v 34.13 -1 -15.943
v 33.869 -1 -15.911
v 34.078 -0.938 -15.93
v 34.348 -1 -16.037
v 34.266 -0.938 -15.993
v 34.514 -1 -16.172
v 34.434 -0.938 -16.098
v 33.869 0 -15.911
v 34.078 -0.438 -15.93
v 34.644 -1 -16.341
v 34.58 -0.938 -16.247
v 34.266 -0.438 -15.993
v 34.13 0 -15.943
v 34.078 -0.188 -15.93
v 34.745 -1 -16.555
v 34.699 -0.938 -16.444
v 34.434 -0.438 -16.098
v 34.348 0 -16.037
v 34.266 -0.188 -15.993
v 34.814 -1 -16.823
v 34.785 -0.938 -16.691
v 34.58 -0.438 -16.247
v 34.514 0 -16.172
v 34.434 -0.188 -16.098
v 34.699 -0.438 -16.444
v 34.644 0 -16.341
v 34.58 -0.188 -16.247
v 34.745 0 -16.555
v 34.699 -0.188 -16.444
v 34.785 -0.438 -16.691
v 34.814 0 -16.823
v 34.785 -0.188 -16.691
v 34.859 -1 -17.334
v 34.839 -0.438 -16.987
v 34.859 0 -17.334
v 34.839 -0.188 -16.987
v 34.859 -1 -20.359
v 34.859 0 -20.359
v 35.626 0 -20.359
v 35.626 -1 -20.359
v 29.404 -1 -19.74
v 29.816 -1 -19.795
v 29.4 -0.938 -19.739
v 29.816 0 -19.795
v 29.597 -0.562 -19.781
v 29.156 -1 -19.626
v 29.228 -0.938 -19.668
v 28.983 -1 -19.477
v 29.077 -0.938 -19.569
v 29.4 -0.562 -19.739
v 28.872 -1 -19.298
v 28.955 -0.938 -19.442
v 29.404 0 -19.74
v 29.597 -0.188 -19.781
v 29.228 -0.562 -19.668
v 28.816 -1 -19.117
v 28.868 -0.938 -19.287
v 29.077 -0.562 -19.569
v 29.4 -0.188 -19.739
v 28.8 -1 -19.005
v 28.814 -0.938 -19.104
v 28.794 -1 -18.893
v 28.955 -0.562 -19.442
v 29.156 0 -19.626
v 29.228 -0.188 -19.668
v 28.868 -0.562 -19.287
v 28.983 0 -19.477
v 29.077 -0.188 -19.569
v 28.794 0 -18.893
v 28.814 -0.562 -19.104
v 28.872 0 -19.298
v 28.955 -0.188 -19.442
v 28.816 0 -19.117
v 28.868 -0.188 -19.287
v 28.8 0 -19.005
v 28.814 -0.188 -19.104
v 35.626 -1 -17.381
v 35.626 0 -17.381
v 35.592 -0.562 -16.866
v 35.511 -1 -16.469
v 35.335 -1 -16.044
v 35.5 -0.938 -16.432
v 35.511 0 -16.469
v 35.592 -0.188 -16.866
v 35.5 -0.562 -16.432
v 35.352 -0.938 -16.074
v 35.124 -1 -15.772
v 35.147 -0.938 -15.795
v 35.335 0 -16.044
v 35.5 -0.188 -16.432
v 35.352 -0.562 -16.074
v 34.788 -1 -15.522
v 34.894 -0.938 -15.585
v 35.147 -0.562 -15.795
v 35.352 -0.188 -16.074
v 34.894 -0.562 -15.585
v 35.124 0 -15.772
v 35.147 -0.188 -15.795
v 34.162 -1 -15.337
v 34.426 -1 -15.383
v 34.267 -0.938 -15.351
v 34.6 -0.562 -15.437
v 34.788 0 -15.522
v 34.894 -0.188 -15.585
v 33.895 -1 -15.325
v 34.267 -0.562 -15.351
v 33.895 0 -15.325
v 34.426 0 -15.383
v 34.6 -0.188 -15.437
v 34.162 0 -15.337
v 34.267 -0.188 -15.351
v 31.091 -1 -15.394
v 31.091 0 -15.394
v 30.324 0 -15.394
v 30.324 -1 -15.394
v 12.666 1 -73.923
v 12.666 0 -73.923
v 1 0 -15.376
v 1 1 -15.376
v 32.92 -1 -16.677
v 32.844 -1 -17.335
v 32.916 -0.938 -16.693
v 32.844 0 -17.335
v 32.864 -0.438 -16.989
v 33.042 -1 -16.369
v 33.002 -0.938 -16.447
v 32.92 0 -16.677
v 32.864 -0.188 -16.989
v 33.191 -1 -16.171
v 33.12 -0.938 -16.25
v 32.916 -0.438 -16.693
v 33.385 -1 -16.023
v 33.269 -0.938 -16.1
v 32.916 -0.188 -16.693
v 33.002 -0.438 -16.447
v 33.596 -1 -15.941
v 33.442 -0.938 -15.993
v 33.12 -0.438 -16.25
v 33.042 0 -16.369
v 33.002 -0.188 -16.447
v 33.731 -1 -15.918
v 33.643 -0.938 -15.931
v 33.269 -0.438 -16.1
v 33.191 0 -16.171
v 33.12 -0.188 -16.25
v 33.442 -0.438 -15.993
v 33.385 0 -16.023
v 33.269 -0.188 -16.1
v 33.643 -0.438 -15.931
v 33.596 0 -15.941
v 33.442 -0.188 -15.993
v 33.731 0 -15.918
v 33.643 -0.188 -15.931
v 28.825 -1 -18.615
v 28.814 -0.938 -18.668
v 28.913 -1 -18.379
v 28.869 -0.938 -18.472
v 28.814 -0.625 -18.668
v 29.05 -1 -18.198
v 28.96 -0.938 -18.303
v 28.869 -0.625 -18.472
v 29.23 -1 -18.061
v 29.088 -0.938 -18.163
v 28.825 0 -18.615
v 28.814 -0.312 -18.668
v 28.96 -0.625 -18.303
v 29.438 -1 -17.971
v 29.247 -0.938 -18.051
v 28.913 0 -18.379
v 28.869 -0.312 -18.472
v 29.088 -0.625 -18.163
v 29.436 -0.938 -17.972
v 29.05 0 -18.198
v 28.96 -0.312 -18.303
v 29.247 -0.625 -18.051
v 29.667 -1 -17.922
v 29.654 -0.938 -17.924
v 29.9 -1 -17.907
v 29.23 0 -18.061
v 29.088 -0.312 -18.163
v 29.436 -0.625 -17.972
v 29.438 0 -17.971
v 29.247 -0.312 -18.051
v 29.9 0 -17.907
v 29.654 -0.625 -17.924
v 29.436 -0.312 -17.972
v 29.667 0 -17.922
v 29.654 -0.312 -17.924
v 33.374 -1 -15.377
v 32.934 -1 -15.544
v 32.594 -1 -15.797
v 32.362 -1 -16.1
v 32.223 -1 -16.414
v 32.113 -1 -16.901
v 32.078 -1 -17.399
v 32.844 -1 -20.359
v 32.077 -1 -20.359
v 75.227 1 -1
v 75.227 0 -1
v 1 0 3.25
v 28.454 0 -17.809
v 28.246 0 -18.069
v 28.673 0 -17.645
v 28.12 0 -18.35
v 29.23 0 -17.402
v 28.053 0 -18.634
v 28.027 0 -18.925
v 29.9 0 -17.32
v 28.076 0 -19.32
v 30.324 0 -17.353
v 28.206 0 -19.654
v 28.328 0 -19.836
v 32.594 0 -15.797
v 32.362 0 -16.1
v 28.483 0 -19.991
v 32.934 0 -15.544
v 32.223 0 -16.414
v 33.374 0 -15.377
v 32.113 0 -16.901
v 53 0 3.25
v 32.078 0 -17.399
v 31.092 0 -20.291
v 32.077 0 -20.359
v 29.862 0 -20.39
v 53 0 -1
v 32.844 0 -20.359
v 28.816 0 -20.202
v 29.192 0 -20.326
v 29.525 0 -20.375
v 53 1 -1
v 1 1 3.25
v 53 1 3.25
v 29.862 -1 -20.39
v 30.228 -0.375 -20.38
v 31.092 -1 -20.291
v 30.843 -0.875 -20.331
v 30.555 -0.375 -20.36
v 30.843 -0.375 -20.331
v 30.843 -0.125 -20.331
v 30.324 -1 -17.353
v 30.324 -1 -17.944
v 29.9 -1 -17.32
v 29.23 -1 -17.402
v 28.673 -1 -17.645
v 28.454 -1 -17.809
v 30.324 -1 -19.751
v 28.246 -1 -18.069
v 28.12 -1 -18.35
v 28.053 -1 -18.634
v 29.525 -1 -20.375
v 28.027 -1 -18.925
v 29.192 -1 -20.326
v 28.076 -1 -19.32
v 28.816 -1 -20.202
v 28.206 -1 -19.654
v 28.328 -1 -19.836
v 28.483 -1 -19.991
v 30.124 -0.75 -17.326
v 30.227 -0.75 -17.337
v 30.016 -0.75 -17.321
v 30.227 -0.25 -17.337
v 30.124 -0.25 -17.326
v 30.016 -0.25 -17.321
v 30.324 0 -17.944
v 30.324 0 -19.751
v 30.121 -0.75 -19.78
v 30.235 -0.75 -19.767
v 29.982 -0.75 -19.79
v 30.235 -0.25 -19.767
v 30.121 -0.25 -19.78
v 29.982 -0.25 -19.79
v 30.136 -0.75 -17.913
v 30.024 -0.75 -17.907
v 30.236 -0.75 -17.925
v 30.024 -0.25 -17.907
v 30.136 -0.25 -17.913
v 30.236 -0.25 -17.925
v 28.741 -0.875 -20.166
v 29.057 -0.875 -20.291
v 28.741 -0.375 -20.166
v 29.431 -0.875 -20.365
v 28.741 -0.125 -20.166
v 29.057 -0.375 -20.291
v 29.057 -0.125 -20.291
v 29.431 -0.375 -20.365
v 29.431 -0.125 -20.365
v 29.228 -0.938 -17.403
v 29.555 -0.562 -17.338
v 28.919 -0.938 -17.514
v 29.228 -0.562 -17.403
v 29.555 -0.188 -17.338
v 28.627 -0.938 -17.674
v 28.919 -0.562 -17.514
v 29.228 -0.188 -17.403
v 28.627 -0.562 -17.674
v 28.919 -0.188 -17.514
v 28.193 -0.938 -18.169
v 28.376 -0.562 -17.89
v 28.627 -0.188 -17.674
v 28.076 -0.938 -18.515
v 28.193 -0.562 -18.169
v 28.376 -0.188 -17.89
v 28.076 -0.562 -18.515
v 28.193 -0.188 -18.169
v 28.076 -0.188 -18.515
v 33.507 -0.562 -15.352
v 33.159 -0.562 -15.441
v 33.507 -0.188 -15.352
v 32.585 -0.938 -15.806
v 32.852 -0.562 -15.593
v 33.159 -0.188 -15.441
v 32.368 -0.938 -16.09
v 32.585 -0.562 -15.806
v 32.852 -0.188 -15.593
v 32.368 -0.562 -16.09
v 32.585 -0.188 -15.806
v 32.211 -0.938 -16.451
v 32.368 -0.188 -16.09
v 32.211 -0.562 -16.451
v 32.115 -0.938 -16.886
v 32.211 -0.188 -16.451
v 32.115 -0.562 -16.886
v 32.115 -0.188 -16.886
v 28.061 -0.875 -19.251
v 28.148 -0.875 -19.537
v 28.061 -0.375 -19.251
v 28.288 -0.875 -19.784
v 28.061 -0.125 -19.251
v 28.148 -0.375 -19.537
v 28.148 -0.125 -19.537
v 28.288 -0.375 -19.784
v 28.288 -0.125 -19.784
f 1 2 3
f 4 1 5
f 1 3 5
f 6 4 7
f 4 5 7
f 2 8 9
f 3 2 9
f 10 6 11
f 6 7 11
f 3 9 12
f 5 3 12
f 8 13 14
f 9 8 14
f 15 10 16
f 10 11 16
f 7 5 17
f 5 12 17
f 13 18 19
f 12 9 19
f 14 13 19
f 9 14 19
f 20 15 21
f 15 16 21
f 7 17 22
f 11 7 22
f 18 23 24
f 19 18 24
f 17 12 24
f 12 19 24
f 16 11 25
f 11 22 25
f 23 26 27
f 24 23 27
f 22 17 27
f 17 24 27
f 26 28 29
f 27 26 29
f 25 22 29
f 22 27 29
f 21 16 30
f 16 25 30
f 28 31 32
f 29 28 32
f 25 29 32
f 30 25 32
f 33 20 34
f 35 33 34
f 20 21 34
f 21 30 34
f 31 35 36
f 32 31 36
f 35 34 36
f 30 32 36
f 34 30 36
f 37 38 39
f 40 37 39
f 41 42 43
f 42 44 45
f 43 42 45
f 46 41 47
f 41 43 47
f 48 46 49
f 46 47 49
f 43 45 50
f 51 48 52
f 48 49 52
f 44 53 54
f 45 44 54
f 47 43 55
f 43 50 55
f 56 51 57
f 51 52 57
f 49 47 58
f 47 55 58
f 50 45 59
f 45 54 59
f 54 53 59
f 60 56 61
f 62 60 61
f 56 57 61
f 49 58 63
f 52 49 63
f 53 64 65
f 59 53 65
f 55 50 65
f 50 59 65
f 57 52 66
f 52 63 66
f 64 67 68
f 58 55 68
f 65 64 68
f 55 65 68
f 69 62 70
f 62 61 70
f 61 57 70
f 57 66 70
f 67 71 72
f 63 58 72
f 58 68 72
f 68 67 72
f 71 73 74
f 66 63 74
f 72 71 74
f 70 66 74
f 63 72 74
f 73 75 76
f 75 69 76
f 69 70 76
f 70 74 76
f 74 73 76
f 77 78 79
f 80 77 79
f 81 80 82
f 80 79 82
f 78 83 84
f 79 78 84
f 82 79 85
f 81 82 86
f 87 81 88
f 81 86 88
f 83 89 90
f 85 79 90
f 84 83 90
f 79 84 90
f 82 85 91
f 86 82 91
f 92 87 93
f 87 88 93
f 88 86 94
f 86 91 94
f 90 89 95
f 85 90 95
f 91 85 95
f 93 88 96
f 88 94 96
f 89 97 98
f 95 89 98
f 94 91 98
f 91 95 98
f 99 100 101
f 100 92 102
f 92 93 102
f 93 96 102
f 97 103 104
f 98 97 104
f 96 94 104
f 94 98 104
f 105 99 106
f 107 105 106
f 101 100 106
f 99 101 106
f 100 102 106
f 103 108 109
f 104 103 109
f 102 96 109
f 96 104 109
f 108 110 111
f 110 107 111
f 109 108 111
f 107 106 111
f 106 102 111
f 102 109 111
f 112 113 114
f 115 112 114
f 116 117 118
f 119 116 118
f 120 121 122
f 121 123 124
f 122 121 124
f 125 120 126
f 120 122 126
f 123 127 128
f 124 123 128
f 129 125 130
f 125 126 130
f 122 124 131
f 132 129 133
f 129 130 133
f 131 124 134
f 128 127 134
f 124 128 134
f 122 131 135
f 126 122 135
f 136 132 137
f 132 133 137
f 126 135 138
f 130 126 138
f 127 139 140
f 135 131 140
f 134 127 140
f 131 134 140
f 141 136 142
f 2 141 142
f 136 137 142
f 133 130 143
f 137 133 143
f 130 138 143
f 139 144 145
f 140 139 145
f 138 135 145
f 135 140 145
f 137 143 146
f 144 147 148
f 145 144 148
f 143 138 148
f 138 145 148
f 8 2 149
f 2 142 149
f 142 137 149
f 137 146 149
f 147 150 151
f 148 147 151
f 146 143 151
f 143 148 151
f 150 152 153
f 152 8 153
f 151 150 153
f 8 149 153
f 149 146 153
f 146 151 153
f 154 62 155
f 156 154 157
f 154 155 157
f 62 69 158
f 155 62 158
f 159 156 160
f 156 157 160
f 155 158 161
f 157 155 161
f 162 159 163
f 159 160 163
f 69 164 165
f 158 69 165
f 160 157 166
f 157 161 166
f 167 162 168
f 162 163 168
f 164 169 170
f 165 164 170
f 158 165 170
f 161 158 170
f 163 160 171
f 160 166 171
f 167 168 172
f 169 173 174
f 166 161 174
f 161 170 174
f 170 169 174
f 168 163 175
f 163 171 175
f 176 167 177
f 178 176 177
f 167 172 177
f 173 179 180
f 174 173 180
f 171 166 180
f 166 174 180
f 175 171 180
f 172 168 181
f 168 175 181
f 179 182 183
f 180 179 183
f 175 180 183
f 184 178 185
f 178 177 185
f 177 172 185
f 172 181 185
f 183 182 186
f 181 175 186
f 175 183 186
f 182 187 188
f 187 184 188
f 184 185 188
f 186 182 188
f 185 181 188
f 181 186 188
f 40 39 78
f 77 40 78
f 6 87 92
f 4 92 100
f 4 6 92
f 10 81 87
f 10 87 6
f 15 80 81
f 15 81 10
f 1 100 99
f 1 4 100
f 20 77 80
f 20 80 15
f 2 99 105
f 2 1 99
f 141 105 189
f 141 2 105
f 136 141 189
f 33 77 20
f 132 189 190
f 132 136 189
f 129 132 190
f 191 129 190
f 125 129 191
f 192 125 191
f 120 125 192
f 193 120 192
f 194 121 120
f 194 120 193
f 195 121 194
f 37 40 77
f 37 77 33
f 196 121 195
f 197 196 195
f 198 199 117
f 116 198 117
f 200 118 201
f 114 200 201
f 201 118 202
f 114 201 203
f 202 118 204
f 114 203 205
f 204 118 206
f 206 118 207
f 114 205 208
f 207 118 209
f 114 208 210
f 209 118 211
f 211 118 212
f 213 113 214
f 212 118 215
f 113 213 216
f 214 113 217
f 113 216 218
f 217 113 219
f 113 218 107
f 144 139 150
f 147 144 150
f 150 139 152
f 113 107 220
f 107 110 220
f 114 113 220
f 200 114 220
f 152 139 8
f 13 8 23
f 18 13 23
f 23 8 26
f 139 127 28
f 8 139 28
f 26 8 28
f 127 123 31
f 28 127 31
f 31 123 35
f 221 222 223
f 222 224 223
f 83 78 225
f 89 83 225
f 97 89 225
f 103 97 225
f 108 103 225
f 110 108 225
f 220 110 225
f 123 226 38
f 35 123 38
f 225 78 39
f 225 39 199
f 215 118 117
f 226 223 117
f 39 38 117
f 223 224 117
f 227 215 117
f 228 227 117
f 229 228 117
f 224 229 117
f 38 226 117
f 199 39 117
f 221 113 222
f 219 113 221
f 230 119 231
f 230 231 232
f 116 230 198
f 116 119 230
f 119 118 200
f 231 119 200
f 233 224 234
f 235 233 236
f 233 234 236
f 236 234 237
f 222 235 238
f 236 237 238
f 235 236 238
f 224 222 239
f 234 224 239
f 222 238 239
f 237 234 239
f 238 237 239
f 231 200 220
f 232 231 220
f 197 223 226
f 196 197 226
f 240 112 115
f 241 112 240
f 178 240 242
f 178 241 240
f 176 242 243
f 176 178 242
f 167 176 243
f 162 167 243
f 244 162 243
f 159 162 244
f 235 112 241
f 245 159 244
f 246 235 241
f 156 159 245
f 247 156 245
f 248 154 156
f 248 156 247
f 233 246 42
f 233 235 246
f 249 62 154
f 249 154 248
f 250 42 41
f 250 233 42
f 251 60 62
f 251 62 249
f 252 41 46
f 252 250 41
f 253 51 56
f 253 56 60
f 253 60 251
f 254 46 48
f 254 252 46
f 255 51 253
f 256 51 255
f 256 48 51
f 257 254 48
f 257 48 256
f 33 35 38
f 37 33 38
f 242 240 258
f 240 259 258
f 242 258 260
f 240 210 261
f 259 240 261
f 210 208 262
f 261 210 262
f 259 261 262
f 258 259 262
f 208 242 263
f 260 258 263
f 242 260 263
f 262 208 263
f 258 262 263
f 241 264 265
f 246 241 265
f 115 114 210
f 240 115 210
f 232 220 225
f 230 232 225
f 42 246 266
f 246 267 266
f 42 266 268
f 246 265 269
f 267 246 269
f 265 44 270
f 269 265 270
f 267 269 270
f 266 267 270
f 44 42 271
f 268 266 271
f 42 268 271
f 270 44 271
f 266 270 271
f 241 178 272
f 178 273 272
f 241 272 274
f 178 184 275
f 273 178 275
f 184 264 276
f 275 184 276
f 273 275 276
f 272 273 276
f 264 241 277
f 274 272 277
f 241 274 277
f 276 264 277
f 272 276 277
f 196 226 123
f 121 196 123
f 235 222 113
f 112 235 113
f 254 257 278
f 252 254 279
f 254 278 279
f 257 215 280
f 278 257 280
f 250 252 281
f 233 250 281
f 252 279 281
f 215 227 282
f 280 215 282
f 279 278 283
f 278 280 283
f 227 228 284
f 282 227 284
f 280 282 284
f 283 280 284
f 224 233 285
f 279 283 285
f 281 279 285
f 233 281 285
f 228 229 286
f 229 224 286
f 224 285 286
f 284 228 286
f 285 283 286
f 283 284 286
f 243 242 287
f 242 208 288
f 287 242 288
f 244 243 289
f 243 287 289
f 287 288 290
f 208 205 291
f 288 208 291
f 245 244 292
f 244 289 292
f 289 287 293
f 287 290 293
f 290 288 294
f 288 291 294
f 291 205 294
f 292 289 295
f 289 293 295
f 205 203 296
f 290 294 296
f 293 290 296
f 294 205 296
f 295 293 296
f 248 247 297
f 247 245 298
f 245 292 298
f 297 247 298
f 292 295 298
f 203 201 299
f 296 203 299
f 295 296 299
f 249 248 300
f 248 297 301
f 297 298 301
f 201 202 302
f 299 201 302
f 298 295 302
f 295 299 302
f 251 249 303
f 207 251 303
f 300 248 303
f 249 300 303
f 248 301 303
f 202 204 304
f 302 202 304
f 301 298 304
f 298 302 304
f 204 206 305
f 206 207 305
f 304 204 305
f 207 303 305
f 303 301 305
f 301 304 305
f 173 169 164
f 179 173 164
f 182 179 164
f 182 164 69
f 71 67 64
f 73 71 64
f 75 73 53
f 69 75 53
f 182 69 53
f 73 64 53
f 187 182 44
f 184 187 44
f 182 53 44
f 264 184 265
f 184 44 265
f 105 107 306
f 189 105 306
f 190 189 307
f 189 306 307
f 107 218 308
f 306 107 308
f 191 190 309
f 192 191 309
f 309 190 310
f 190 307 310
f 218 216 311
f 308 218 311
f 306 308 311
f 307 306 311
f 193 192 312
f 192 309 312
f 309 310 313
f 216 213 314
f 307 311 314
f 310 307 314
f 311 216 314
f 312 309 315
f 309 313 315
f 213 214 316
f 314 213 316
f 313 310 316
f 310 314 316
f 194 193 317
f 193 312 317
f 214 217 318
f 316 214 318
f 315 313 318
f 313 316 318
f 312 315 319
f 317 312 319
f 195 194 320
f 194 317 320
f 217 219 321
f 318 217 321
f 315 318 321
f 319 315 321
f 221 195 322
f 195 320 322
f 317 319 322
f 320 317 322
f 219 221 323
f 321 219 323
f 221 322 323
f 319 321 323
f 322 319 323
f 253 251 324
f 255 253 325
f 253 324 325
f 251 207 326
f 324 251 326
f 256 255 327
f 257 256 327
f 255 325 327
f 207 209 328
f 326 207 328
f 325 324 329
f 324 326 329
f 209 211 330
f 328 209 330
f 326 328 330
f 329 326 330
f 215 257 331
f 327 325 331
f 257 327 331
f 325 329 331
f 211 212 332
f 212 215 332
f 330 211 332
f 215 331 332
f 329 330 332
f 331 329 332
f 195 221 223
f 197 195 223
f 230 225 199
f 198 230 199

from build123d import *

# Parameters (mm, degrees)
EXTRUDE_1_DEPTH = 1
EXTRUDE_2_DEPTH = 1


with BuildPart() as part:
    # 草图1 → 凸台-拉伸1 (new body)
    with BuildSketch(Plane(origin=(0, 0, 0), x_dir=(1, 0, 0), z_dir=(0, 1, 0))):
        Polygon((12.66597943, 73.92266442), (1, 15.376339461), (1, -3.25), (53, -3.25), (53, 1), (75.227111726, 1), align=None)
    extrude(amount=EXTRUDE_1_DEPTH)

    # 草图2 → 凸台-拉伸2 (add)
    # profile 1 of 2: a face of its own
    with BuildSketch(Plane(origin=(0, 0, 0), x_dir=(1, 0, 0), z_dir=(0, 1, 0))):
        with BuildLine():
            Line((31.090740008, 15.394221889), (30.323543176, 15.394221889))
            Line((30.323543176, 15.394221889), (30.323543176, 17.352620355))
            add(Edge.make_bspline(
                [(30.323543176, 17.352620355), (30.291480188, 17.346927632), (30.225432017, 17.335200902), (30.122464474, 17.325658206), (30.013401991, 17.319675849), (29.938694803, 17.319783871), (29.900262675, 17.319839442)],
                knots=[0, 0, 0, 0, 0.918585764, 1.892241272, 2.915691322, 4, 4, 4, 4], degree=3))
            add(Edge.make_bspline(
                [(29.900262675, 17.319839442), (29.841962947, 17.319869767), (29.726722993, 17.319929711), (29.556261285, 17.335932691), (29.390055361, 17.361937179), (29.228423578, 17.400915644), (29.070924954, 17.451283461), (28.917434146, 17.512464376), (28.768763104, 17.586671732), (28.62561681, 17.671704257), (28.490911455, 17.769835394), (28.373499458, 17.887220571), (28.271718538, 18.019975809), (28.188806413, 18.170044776), (28.12115622, 18.335792286), (28.072018776, 18.517995324), (28.038306105, 18.716089526), (28.030646768, 18.853776873), (28.026679563, 18.925092951)],
                knots=[0, 0, 0, 0, 1.003522523, 1.98364375, 2.944869411, 3.898614004, 4.843729631, 5.790462383, 6.741287792, 7.702146141, 8.655643954, 9.602935836, 10.551034771, 11.527201242, 12.5464735, 13.626777097, 14.770773406, 16, 16, 16, 16], degree=3))
            add(Edge.make_bspline(
                [(28.026679563, 18.925092951), (28.029126999, 18.981235603), (28.033891792, 19.09053695), (28.057781565, 19.249075834), (28.094861108, 19.397722477), (28.143989367, 19.537154386), (28.209760487, 19.66561534), (28.285926292, 19.785665607), (28.377011339, 19.895385017), (28.447566531, 19.958919299), (28.483028853, 19.990852784)],
                knots=[0, 0, 0, 0, 1.126595518, 2.193312949, 3.209115705, 4.196248007, 5.151139266, 6.097382339, 7.043709754, 8, 8, 8, 8], degree=3))
            add(Edge.make_bspline(
                [(28.483028853, 19.990852784), (28.522929015, 20.023049122), (28.603984669, 20.088454754), (28.741989665, 20.169383539), (28.893542525, 20.238034743), (29.059185588, 20.295093718), (29.239564674, 20.338290061), (29.434352813, 20.367230207), (29.64317297, 20.387190847), (29.787147929, 20.388758207), (29.861524951, 20.3895679)],
                knots=[0, 0, 0, 0, 0.838628006, 1.70364077, 2.610636308, 3.559859354, 4.568055018, 5.643200099, 6.782484425, 8, 8, 8, 8], degree=3))
            add(Edge.make_bspline(
                [(29.861524951, 20.3895679), (29.924201068, 20.388442465), (30.046421709, 20.386247828), (30.224716607, 20.380809359), (30.393254737, 20.372443419), (30.551968816, 20.360836156), (30.701043327, 20.348103258), (30.840301091, 20.33201309), (30.969478734, 20.313349379), (31.052038447, 20.298457491), (31.091683908, 20.291306355)],
                knots=[0, 0, 0, 0, 1.217605855, 2.374374404, 3.464660226, 4.494999595, 5.465333604, 6.370582827, 7.217548217, 8, 8, 8, 8], degree=3))
            Line((31.091683908, 20.291306355), (31.090740008, 15.394221889))
        make_face()
        with BuildLine():
            add(Edge.make_bspline(
                [(30.323543176, 19.750609507), (30.294001104, 19.756441871), (30.227115227, 19.76964686), (30.11276139, 19.781736761), (29.973146382, 19.790998313), (29.871306917, 19.79377259), (29.816173468, 19.795274517)],
                knots=[0, 0, 0, 0, 0.708180311, 1.603383121, 2.702528978, 4, 4, 4, 4], degree=3))
            add(Edge.make_bspline(
                [(29.816173468, 19.795274517), (29.778674753, 19.794489016), (29.705419893, 19.792954518), (29.598288212, 19.782736487), (29.496988537, 19.764581207), (29.401019543, 19.740409824), (29.311269908, 19.708215699), (29.227058284, 19.669148461), (29.148784868, 19.623070355), (29.076655109, 19.569835898), (29.010798742, 19.510512464), (28.953667436, 19.442775826), (28.905730333, 19.367849012), (28.86536387, 19.286573026), (28.83427513, 19.198006126), (28.811939273, 19.102330333), (28.797510474, 18.999843052), (28.79510899, 18.929236118), (28.793875472, 18.892968984)],
                knots=[0, 0, 0, 0, 1.164286524, 2.274468469, 3.33712435, 4.356941393, 5.343590938, 6.292901648, 7.23538906, 8.158502959, 9.072142365, 9.981112688, 10.900594105, 11.827687296, 12.792632354, 13.80775062, 14.873954761, 16, 16, 16, 16], degree=3))
            add(Edge.make_bspline(
                [(28.793875472, 18.892968984), (28.795134881, 18.854191832), (28.797580351, 18.778895935), (28.811554204, 18.669650618), (28.835574304, 18.567590725), (28.867328792, 18.472146789), (28.907923347, 18.383372416), (28.95859169, 18.302223365), (29.018603775, 18.228366562), (29.086740761, 18.16077878), (29.163691225, 18.101659974), (29.247154269, 18.048964292), (29.338736059, 18.005658508), (29.437186031, 17.969976467), (29.54264825, 17.941254338), (29.655625397, 17.922037488), (29.775583455, 17.909511306), (29.858027897, 17.907569166), (29.900262675, 17.906574244)],
                knots=[0, 0, 0, 0, 1.10647952, 2.148516939, 3.135813804, 4.093347323, 5.013956832, 5.913991464, 6.814877829, 7.723438285, 8.645449828, 9.577866136, 10.534345172, 11.529217628, 12.562346088, 13.648092354, 14.795160789, 16, 16, 16, 16], degree=3))
            add(Edge.make_bspline(
                [(29.900262675, 17.906574244), (29.941533493, 17.906028809), (30.020359402, 17.904987046), (30.132306289, 17.911998092), (30.23270458, 17.922996362), (30.294355499, 17.937500422), (30.323543176, 17.944367146)],
                knots=[0, 0, 0, 0, 1.161518353, 2.218461969, 3.156558288, 4, 4, 4, 4], degree=3))
            Line((30.323543176, 17.944367146), (30.323543176, 19.750609507))
        make_face(mode=Mode.SUBTRACT)
    # profile 2 of 2: a face of its own
    with BuildSketch(Plane(origin=(0, 0, 0), x_dir=(1, 0, 0), z_dir=(0, 1, 0))):
        with BuildLine():
            Line((32.077134748, 20.358527157), (32.844331579, 20.358527157))
            Line((32.844331579, 20.358527157), (32.844331579, 17.334805283))
            add(Edge.make_bspline(
                [(32.844331579, 17.334805283), (32.846041524, 17.274995945), (32.849340681, 17.159600138), (32.862116571, 16.992717533), (32.883577596, 16.838338831), (32.913517977, 16.696138778), (32.951987807, 16.566089797), (32.999008574, 16.448639235), (33.054117718, 16.34331339), (33.117299737, 16.250152646), (33.189122104, 16.169354435), (33.266600201, 16.098618835), (33.351533105, 16.040070587), (33.442049228, 15.99081552), (33.539783431, 15.954258392), (33.643837974, 15.928897808), (33.754040259, 15.91342912), (33.829727782, 15.911895168), (33.868517376, 15.911109023)],
                knots=[0, 0, 0, 0, 1.442558911, 2.783265207, 4.033293762, 5.19797452, 6.283894868, 7.299176403, 8.243481286, 9.144954945, 10.005756174, 10.844503658, 11.66816234, 12.486940923, 13.323278702, 14.176003432, 15.065208066, 16, 16, 16, 16], degree=3))
            add(Edge.make_bspline(
                [(33.868517376, 15.911109023), (33.904473646, 15.911526383), (33.97484436, 15.912343207), (34.077658287, 15.92781335), (34.174878032, 15.954543092), (34.267116792, 15.991646317), (34.354322253, 16.038718034), (34.435688698, 16.097382655), (34.511493017, 16.167040691), (34.582608735, 16.247198802), (34.646508679, 16.340053843), (34.701762221, 16.445170296), (34.749598601, 16.562786913), (34.787162737, 16.693178193), (34.818776759, 16.835728654), (34.84076289, 16.990817804), (34.855116558, 17.158326046), (34.857473172, 17.274141756), (34.858691406, 17.33401178)],
                knots=[0, 0, 0, 0, 0.880869997, 1.723967724, 2.54076827, 3.348096003, 4.15667844, 4.964596865, 5.80091263, 6.676282017, 7.586647838, 8.557371955, 9.582678263, 10.694376867, 11.880403812, 13.160330013, 14.532054847, 16, 16, 16, 16], degree=3))
            Line((34.858691406, 17.33401178), (34.858691406, 20.358527157))
            Line((34.858691406, 20.358527157), (35.625888237, 20.358527157))
            Line((35.625888237, 20.358527157), (35.625888237, 17.380520301))
            add(Edge.make_bspline(
                [(35.625888237, 17.380520301), (35.623936714, 17.291573771), (35.620165761, 17.119701207), (35.595302232, 16.872154063), (35.557140127, 16.644043754), (35.504575812, 16.435278366), (35.438009439, 16.245400882), (35.356778606, 16.074929633), (35.261228593, 15.923975043), (35.150246411, 15.793333485), (35.02731822, 15.680891375), (34.895571803, 15.582265655), (34.752268142, 15.501033739), (34.599951136, 15.43349429), (34.437335243, 15.382310688), (34.264956857, 15.348185822), (34.083249013, 15.326302213), (33.958656361, 15.325651598), (33.894972407, 15.325319044)],
                knots=[0, 0, 0, 0, 1.389947096, 2.68581329, 3.884176986, 5.001519278, 6.046082896, 7.023506491, 7.946473535, 8.830015835, 9.69383004, 10.545329235, 11.396344648, 12.262399475, 13.145009074, 14.054291982, 15.00547603, 16, 16, 16, 16], degree=3))
            add(Edge.make_bspline(
                [(33.894972407, 15.325319044), (33.828469528, 15.326101711), (33.698576147, 15.327630415), (33.508729563, 15.348474132), (33.329189291, 15.385576465), (33.159391405, 15.436827956), (33.000035358, 15.505949179), (32.850490052, 15.58964615), (32.711713219, 15.690227791), (32.581893571, 15.804556755), (32.464864256, 15.937598686), (32.363164513, 16.09050188), (32.277381449, 16.262754247), (32.206934074, 16.45360011), (32.151146625, 16.663013971), (32.111664078, 16.891642935), (32.084450881, 17.139060264), (32.080248305, 17.310628986), (32.078078648, 17.399204536)],
                knots=[0, 0, 0, 0, 1.013962662, 1.980471211, 2.907472823, 3.806985122, 4.680561309, 5.551651082, 6.415505808, 7.289926821, 8.185106327, 9.109702809, 10.082849364, 11.113391155, 12.207519227, 13.383461846, 14.649163417, 16, 16, 16, 16], degree=3))
            Line((32.078078648, 17.399204536), (32.077134748, 20.358527157))
        make_face()
    extrude(amount=-EXTRUDE_2_DEPTH)


solid = part.part
